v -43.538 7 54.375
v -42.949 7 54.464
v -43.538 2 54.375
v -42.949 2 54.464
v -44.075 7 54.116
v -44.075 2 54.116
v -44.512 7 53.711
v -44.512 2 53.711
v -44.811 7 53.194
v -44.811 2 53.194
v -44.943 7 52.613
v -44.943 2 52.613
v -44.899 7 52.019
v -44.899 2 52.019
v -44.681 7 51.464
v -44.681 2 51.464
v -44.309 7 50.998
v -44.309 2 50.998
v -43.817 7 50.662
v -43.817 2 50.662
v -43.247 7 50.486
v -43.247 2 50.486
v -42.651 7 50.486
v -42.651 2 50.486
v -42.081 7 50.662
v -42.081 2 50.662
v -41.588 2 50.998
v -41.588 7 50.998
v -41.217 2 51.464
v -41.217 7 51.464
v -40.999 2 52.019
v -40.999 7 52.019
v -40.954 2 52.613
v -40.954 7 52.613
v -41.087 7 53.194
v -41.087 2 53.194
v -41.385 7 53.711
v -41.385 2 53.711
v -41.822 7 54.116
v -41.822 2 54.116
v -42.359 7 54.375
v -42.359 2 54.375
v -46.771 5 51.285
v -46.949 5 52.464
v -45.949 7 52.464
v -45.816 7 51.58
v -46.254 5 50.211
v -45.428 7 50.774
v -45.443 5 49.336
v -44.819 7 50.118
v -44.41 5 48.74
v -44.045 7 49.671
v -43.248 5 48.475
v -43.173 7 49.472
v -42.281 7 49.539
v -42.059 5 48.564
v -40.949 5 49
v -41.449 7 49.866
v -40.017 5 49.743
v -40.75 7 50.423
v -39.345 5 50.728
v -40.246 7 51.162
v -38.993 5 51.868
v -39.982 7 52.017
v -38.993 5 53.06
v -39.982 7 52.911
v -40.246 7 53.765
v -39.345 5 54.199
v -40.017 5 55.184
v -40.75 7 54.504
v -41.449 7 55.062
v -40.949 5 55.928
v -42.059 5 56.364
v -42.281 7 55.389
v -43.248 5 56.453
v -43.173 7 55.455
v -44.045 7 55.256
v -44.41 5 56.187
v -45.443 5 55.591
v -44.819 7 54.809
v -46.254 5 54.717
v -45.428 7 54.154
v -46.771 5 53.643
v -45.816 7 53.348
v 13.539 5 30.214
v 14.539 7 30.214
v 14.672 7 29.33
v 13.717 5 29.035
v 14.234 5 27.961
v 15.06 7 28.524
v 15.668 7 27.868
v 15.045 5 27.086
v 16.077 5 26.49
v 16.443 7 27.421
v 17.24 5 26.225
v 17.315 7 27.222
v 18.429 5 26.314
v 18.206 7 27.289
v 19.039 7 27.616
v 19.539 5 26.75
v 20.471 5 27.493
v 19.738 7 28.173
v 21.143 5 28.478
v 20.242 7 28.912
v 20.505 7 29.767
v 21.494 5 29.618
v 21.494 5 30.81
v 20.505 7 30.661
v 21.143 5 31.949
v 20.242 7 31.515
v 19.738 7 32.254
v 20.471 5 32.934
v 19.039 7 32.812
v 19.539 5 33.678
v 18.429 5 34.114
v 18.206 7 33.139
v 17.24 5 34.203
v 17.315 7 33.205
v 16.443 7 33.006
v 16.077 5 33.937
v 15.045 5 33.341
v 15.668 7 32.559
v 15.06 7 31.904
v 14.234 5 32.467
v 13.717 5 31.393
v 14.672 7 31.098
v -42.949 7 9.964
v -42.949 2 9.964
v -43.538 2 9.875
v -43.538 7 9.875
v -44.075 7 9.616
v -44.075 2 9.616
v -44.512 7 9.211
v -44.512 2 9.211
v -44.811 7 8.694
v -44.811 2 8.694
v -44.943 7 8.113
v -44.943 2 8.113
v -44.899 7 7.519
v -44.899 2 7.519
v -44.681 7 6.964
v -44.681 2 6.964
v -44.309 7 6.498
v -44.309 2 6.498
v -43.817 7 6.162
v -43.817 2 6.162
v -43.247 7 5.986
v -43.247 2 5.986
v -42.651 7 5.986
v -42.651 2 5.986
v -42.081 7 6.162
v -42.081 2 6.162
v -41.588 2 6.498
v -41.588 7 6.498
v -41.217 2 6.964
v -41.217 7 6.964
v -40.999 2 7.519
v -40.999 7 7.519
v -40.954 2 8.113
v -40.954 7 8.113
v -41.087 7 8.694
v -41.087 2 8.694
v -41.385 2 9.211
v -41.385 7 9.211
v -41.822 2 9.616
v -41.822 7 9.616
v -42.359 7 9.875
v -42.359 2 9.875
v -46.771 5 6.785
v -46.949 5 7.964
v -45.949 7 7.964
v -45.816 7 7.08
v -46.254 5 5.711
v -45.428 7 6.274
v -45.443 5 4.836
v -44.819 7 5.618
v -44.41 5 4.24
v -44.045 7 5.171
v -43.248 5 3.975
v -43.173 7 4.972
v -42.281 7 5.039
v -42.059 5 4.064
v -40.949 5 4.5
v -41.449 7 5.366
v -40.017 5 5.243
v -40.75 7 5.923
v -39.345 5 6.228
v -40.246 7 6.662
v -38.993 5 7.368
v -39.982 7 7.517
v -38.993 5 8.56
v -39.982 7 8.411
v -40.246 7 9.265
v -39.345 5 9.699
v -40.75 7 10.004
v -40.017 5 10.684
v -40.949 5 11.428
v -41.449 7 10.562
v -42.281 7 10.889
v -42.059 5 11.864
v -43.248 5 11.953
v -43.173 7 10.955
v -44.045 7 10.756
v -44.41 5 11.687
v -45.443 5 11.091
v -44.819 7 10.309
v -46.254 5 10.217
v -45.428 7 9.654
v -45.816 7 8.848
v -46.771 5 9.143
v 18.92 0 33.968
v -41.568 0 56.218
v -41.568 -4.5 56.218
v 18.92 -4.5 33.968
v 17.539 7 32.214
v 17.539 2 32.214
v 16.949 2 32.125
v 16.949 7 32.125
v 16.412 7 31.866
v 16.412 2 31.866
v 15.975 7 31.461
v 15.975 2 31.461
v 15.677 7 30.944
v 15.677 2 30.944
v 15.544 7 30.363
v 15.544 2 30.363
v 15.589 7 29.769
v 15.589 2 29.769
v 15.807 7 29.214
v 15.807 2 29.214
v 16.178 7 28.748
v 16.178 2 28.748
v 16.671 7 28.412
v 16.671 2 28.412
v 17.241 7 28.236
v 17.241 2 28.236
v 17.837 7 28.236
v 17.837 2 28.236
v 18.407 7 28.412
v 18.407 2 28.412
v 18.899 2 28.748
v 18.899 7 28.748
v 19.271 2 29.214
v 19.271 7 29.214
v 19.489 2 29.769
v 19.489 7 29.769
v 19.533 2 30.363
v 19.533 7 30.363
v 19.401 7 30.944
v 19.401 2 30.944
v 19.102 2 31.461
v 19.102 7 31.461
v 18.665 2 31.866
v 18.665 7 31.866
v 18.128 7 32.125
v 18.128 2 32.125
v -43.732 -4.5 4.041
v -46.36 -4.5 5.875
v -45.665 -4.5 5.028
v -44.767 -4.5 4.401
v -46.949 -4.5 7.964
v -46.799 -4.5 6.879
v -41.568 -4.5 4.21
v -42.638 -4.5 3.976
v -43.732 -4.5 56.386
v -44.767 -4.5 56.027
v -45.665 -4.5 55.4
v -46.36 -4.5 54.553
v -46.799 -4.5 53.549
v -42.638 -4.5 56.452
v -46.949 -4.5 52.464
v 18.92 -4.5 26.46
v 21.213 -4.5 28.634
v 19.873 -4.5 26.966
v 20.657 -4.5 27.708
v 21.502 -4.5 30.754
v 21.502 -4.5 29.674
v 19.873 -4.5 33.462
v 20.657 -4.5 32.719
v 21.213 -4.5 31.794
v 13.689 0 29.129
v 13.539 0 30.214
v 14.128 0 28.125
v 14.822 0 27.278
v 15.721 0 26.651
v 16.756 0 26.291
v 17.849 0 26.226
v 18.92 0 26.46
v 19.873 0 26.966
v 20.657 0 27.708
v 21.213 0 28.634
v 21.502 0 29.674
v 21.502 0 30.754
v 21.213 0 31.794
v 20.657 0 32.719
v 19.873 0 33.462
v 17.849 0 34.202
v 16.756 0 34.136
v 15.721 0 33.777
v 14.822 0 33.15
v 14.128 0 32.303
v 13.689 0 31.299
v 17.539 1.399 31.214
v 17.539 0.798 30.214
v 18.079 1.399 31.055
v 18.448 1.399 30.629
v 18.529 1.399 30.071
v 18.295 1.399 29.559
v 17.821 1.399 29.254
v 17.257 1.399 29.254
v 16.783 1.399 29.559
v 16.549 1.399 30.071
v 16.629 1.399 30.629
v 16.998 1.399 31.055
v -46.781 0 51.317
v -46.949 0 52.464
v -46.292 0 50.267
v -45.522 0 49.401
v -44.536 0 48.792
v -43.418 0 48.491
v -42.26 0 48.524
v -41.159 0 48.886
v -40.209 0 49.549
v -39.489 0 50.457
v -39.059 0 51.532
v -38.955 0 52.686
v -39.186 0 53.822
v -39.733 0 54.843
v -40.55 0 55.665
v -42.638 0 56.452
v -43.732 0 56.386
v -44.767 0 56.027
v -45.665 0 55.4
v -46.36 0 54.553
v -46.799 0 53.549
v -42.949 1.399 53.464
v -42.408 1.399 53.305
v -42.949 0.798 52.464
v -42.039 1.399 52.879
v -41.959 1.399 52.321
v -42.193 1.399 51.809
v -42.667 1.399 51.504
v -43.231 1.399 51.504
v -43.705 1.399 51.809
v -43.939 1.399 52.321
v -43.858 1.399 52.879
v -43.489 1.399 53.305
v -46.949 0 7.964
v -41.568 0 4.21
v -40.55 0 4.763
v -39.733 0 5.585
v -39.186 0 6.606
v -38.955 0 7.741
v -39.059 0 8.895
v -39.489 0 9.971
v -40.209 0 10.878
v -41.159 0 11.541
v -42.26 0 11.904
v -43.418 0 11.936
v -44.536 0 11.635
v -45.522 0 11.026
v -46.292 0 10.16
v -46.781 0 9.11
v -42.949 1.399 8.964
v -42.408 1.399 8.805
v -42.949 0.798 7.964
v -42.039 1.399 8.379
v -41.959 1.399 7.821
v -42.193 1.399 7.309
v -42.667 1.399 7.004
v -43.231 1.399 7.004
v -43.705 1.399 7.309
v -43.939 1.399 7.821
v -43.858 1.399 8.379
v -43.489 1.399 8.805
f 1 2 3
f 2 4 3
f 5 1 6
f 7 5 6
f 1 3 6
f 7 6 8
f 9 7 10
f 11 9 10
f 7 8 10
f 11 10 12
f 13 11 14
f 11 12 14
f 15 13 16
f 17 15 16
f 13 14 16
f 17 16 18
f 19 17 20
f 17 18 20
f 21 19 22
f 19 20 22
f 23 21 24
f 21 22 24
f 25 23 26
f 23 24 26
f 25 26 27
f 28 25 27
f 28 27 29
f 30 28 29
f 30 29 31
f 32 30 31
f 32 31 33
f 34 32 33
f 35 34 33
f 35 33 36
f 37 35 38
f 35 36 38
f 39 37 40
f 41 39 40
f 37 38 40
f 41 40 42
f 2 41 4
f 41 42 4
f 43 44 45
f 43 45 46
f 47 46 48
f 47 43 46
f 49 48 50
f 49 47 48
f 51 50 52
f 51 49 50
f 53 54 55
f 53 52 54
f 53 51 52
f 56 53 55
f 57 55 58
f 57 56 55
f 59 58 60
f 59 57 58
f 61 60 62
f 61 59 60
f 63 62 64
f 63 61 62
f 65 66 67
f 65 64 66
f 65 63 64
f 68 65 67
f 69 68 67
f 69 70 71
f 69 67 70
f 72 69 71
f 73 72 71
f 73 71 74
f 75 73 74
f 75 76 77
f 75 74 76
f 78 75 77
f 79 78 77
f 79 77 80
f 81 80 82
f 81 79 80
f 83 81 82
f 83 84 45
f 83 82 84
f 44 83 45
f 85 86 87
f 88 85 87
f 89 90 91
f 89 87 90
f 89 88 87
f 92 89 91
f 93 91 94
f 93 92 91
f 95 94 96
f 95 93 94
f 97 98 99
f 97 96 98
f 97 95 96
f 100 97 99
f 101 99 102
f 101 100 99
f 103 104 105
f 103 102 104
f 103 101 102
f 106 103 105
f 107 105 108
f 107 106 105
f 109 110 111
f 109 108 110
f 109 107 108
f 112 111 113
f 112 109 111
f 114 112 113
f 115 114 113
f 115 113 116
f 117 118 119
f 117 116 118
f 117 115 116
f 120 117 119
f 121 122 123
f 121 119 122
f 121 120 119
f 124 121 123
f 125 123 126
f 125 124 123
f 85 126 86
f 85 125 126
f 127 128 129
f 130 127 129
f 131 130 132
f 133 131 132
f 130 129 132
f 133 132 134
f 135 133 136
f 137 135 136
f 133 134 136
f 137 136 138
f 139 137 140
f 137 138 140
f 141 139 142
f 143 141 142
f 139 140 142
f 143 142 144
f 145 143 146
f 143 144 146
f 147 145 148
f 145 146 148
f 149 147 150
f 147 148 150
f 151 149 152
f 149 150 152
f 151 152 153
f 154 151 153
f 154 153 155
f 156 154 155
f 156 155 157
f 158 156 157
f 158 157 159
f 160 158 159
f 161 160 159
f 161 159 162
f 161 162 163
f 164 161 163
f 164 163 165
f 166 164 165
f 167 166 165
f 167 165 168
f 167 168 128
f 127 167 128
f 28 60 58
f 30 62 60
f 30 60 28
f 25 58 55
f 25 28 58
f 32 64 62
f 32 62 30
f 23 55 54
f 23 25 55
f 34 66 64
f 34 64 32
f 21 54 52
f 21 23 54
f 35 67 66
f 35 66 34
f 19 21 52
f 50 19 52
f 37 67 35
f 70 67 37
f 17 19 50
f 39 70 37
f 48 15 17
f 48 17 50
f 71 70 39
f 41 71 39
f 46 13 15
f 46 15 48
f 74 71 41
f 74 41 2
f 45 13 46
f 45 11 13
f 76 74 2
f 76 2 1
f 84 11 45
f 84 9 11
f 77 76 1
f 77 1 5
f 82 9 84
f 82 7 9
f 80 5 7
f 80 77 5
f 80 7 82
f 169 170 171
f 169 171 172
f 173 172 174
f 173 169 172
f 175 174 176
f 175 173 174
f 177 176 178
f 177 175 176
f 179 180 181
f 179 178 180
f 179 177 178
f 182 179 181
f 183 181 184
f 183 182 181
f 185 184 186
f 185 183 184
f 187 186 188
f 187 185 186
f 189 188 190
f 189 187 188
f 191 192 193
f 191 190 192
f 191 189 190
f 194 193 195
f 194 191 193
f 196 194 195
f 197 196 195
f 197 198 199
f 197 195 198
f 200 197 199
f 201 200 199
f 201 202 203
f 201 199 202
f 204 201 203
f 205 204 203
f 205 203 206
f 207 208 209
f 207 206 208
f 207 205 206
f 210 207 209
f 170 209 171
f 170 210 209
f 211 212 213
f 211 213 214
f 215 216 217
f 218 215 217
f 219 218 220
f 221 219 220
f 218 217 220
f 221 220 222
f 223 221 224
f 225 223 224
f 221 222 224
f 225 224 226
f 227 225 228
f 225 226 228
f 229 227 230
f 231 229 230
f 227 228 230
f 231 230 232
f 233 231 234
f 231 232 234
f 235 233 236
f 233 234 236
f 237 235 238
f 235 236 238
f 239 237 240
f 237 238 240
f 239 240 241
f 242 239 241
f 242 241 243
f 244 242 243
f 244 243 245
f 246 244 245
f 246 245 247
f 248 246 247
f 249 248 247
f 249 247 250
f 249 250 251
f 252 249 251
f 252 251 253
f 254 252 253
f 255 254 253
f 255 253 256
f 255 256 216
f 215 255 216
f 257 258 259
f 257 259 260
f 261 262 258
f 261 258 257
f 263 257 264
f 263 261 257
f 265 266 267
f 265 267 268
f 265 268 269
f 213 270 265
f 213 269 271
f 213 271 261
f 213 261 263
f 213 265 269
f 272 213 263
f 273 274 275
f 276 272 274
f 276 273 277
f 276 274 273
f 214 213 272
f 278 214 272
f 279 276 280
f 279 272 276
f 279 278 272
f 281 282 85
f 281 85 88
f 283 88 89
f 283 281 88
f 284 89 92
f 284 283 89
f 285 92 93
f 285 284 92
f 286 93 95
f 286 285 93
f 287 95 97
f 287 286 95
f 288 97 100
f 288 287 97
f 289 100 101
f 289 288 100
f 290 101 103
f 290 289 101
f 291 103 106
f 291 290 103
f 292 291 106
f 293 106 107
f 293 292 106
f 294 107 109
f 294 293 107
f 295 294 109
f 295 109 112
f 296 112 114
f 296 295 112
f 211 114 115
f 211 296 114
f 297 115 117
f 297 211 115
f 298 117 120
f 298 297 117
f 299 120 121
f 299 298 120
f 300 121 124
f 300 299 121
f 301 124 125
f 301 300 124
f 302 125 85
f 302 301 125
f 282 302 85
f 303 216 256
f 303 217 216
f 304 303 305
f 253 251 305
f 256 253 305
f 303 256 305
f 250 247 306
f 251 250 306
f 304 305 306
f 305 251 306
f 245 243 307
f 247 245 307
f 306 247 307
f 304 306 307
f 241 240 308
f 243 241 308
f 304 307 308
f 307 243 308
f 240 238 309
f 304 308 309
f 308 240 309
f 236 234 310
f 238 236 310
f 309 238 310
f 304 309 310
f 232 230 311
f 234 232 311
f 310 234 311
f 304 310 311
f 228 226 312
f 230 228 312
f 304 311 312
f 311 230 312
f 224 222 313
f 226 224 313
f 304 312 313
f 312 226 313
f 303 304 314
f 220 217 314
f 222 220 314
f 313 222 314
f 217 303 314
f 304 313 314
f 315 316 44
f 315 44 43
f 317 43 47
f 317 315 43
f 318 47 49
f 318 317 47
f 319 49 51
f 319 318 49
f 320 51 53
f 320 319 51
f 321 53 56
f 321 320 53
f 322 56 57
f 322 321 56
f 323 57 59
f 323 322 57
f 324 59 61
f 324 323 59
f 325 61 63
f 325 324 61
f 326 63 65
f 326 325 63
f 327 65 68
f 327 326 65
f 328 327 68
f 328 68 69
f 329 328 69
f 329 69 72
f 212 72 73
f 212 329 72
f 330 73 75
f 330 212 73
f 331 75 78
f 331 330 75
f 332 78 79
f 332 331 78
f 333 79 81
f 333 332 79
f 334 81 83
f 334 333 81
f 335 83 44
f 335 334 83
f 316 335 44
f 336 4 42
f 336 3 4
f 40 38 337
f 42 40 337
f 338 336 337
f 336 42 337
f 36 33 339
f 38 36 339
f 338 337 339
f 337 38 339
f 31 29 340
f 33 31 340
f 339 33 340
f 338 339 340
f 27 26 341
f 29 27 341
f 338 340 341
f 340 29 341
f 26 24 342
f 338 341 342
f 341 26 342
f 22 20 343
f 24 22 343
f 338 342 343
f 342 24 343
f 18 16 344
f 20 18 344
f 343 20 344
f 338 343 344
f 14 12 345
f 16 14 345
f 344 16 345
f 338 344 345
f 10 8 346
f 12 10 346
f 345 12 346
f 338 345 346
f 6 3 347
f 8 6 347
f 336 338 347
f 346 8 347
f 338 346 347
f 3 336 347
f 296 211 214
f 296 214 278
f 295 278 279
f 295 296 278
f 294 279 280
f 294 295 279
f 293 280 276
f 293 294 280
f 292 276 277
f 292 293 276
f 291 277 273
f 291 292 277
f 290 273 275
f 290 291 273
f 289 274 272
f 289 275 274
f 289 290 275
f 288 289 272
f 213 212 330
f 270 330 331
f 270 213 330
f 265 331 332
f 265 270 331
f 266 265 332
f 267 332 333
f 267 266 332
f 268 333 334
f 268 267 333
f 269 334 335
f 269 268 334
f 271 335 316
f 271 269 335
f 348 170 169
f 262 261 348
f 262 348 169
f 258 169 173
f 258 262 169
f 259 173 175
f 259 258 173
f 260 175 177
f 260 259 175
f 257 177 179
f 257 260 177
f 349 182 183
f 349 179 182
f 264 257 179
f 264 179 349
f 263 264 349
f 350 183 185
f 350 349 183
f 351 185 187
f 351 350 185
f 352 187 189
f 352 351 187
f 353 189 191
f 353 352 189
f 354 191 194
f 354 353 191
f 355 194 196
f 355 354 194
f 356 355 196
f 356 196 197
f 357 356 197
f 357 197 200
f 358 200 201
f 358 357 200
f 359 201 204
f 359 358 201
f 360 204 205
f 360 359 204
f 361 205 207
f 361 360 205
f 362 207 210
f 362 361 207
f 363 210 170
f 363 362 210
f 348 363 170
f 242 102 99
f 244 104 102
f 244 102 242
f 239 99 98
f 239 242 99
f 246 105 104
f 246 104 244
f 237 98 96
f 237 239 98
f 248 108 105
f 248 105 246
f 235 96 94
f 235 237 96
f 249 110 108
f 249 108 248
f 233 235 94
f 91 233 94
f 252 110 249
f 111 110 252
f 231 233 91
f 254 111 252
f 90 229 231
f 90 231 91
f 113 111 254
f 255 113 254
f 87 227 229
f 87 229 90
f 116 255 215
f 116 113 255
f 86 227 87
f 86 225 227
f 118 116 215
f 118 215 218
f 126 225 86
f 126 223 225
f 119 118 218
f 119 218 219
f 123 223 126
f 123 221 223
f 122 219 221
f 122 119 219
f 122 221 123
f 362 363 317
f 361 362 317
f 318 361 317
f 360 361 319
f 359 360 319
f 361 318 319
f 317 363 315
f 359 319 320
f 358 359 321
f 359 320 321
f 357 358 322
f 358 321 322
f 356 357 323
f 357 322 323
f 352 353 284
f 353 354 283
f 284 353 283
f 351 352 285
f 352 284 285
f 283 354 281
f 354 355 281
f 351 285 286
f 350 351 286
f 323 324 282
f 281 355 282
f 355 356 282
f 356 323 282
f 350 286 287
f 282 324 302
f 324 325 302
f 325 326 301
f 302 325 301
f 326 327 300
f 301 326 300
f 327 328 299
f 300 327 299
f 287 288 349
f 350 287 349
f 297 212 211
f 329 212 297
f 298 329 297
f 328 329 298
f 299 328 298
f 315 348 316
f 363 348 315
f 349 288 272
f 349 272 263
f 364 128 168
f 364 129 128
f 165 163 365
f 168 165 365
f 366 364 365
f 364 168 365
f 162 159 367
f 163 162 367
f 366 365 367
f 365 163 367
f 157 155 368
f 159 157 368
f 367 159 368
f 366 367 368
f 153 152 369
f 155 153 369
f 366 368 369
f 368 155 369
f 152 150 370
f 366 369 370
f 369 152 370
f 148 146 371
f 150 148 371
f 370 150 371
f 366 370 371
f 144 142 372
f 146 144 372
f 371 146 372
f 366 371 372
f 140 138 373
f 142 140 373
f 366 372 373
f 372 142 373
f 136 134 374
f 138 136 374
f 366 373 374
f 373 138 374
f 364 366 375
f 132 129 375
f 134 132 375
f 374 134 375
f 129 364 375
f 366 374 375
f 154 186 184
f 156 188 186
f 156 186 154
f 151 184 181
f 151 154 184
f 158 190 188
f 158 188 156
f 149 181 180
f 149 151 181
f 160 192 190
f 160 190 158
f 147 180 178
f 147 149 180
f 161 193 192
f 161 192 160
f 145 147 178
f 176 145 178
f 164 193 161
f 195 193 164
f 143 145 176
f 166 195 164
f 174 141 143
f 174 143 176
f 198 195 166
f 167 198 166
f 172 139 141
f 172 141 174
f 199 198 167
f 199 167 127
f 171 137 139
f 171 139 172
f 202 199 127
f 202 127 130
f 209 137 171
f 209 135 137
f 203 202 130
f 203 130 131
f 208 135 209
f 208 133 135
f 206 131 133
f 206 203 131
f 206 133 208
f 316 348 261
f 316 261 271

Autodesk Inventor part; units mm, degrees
ref_plane "YZ Plane" through (0, 0, 0) normal (1, 0, 0) x (0, 1, 0)
ref_plane "XZ Plane" through (0, 0, 0) normal (0, 1, 0) x (-1, 0, 0)
ref_plane "XY Plane" through (0, 0, 0) normal (0, 0, 1) x (1, 0, 0)
sketch "Connector Hole Layout" plane through (0, 0, 0) normal (0, 1, 0) x (-1, 0, 0)
  circle A0 centre (42.9488, 7.9638) radius 1.6 construction
  circle A1 centre (-17.5388, 30.2138) radius 1.6 construction
  circle A2 centre (42.9488, 52.4638) radius 1.6 construction
  line L0 (42.9488, 7.9638) -> (42.9488, 52.4638) construction
  line L1 (41.4471, 51.9114) -> (-16.0371, 30.7661) construction
  point P0 (42.9488, 30.2138)
  dimension "d0" = 3.2
  dimension "d22" = 44.5
  dimension "d23" = 61.25
sketch "Sketch8" plane through (0, 0, 0) normal (0, 1, 0) x (-1, 0, 0)
  circle A0 centre (42.9488, 7.9638) radius 1.6 construction
  circle A1 centre (42.9488, 52.4638) radius 1.6 construction
  circle A2 centre (-17.5388, 30.2138) radius 1.6 construction
  circle A3 centre (42.9488, 7.9638) radius 4
  point P0 (0, 0)
  dimension "d51" = 8
extrude "Extrusion5" add sketch "Sketch8" along normal blind 7
sketch "Sketch9" plane through (-42.9488, 7, 7.9638) normal (0, 1, 0) x (1, 0, 0)
  point P0 (42.9488, 7.9638)
  point P1 (0, 0)
hole "Hole2" at (-42.9488, 7, 7.9638) direction (0, -1, 0) diameter 4 depth 5 tip angle 118
chamfer "Chamfer3" distance 1 distance2 2 1 edges at (-38.9488, 7, 7.9638) measured on face at (-46.2385, 7, 7.5643)
pattern_sketch "Sketch Driven Pattern1" from (-42.9488, 0, 7.9638) copies at (-42.9488, 0, 52.4638) at (17.5388, 0, 30.2138)
sketch "Sketch10" plane through (-42.9488, 0, 52.4638) normal (0, -1, 0) x (1, 0, 0)
  circle A0 centre (0, 0) radius 4 projected
  line L0 (1.3809, 3.7541) -> (61.8684, -18.4959)
  circle A1 centre (60.4875, -22.25) radius 4 projected
  line L1 (61.8684, -26.0041) -> (1.3809, -48.2541)
  circle A2 centre (0, -44.5) radius 4 projected
  line L2 (-4, -44.5) -> (-4, 0)
  circle A3 centre (0, 0) radius 4 projected
  circle A4 centre (0, -44.5) radius 4 projected
  point P0 (42.9488, -52.4638)
extrude "Extrusion6" add sketch "Sketch10" along normal blind 4.5
properties part number "db-25_standoffs_plate"
